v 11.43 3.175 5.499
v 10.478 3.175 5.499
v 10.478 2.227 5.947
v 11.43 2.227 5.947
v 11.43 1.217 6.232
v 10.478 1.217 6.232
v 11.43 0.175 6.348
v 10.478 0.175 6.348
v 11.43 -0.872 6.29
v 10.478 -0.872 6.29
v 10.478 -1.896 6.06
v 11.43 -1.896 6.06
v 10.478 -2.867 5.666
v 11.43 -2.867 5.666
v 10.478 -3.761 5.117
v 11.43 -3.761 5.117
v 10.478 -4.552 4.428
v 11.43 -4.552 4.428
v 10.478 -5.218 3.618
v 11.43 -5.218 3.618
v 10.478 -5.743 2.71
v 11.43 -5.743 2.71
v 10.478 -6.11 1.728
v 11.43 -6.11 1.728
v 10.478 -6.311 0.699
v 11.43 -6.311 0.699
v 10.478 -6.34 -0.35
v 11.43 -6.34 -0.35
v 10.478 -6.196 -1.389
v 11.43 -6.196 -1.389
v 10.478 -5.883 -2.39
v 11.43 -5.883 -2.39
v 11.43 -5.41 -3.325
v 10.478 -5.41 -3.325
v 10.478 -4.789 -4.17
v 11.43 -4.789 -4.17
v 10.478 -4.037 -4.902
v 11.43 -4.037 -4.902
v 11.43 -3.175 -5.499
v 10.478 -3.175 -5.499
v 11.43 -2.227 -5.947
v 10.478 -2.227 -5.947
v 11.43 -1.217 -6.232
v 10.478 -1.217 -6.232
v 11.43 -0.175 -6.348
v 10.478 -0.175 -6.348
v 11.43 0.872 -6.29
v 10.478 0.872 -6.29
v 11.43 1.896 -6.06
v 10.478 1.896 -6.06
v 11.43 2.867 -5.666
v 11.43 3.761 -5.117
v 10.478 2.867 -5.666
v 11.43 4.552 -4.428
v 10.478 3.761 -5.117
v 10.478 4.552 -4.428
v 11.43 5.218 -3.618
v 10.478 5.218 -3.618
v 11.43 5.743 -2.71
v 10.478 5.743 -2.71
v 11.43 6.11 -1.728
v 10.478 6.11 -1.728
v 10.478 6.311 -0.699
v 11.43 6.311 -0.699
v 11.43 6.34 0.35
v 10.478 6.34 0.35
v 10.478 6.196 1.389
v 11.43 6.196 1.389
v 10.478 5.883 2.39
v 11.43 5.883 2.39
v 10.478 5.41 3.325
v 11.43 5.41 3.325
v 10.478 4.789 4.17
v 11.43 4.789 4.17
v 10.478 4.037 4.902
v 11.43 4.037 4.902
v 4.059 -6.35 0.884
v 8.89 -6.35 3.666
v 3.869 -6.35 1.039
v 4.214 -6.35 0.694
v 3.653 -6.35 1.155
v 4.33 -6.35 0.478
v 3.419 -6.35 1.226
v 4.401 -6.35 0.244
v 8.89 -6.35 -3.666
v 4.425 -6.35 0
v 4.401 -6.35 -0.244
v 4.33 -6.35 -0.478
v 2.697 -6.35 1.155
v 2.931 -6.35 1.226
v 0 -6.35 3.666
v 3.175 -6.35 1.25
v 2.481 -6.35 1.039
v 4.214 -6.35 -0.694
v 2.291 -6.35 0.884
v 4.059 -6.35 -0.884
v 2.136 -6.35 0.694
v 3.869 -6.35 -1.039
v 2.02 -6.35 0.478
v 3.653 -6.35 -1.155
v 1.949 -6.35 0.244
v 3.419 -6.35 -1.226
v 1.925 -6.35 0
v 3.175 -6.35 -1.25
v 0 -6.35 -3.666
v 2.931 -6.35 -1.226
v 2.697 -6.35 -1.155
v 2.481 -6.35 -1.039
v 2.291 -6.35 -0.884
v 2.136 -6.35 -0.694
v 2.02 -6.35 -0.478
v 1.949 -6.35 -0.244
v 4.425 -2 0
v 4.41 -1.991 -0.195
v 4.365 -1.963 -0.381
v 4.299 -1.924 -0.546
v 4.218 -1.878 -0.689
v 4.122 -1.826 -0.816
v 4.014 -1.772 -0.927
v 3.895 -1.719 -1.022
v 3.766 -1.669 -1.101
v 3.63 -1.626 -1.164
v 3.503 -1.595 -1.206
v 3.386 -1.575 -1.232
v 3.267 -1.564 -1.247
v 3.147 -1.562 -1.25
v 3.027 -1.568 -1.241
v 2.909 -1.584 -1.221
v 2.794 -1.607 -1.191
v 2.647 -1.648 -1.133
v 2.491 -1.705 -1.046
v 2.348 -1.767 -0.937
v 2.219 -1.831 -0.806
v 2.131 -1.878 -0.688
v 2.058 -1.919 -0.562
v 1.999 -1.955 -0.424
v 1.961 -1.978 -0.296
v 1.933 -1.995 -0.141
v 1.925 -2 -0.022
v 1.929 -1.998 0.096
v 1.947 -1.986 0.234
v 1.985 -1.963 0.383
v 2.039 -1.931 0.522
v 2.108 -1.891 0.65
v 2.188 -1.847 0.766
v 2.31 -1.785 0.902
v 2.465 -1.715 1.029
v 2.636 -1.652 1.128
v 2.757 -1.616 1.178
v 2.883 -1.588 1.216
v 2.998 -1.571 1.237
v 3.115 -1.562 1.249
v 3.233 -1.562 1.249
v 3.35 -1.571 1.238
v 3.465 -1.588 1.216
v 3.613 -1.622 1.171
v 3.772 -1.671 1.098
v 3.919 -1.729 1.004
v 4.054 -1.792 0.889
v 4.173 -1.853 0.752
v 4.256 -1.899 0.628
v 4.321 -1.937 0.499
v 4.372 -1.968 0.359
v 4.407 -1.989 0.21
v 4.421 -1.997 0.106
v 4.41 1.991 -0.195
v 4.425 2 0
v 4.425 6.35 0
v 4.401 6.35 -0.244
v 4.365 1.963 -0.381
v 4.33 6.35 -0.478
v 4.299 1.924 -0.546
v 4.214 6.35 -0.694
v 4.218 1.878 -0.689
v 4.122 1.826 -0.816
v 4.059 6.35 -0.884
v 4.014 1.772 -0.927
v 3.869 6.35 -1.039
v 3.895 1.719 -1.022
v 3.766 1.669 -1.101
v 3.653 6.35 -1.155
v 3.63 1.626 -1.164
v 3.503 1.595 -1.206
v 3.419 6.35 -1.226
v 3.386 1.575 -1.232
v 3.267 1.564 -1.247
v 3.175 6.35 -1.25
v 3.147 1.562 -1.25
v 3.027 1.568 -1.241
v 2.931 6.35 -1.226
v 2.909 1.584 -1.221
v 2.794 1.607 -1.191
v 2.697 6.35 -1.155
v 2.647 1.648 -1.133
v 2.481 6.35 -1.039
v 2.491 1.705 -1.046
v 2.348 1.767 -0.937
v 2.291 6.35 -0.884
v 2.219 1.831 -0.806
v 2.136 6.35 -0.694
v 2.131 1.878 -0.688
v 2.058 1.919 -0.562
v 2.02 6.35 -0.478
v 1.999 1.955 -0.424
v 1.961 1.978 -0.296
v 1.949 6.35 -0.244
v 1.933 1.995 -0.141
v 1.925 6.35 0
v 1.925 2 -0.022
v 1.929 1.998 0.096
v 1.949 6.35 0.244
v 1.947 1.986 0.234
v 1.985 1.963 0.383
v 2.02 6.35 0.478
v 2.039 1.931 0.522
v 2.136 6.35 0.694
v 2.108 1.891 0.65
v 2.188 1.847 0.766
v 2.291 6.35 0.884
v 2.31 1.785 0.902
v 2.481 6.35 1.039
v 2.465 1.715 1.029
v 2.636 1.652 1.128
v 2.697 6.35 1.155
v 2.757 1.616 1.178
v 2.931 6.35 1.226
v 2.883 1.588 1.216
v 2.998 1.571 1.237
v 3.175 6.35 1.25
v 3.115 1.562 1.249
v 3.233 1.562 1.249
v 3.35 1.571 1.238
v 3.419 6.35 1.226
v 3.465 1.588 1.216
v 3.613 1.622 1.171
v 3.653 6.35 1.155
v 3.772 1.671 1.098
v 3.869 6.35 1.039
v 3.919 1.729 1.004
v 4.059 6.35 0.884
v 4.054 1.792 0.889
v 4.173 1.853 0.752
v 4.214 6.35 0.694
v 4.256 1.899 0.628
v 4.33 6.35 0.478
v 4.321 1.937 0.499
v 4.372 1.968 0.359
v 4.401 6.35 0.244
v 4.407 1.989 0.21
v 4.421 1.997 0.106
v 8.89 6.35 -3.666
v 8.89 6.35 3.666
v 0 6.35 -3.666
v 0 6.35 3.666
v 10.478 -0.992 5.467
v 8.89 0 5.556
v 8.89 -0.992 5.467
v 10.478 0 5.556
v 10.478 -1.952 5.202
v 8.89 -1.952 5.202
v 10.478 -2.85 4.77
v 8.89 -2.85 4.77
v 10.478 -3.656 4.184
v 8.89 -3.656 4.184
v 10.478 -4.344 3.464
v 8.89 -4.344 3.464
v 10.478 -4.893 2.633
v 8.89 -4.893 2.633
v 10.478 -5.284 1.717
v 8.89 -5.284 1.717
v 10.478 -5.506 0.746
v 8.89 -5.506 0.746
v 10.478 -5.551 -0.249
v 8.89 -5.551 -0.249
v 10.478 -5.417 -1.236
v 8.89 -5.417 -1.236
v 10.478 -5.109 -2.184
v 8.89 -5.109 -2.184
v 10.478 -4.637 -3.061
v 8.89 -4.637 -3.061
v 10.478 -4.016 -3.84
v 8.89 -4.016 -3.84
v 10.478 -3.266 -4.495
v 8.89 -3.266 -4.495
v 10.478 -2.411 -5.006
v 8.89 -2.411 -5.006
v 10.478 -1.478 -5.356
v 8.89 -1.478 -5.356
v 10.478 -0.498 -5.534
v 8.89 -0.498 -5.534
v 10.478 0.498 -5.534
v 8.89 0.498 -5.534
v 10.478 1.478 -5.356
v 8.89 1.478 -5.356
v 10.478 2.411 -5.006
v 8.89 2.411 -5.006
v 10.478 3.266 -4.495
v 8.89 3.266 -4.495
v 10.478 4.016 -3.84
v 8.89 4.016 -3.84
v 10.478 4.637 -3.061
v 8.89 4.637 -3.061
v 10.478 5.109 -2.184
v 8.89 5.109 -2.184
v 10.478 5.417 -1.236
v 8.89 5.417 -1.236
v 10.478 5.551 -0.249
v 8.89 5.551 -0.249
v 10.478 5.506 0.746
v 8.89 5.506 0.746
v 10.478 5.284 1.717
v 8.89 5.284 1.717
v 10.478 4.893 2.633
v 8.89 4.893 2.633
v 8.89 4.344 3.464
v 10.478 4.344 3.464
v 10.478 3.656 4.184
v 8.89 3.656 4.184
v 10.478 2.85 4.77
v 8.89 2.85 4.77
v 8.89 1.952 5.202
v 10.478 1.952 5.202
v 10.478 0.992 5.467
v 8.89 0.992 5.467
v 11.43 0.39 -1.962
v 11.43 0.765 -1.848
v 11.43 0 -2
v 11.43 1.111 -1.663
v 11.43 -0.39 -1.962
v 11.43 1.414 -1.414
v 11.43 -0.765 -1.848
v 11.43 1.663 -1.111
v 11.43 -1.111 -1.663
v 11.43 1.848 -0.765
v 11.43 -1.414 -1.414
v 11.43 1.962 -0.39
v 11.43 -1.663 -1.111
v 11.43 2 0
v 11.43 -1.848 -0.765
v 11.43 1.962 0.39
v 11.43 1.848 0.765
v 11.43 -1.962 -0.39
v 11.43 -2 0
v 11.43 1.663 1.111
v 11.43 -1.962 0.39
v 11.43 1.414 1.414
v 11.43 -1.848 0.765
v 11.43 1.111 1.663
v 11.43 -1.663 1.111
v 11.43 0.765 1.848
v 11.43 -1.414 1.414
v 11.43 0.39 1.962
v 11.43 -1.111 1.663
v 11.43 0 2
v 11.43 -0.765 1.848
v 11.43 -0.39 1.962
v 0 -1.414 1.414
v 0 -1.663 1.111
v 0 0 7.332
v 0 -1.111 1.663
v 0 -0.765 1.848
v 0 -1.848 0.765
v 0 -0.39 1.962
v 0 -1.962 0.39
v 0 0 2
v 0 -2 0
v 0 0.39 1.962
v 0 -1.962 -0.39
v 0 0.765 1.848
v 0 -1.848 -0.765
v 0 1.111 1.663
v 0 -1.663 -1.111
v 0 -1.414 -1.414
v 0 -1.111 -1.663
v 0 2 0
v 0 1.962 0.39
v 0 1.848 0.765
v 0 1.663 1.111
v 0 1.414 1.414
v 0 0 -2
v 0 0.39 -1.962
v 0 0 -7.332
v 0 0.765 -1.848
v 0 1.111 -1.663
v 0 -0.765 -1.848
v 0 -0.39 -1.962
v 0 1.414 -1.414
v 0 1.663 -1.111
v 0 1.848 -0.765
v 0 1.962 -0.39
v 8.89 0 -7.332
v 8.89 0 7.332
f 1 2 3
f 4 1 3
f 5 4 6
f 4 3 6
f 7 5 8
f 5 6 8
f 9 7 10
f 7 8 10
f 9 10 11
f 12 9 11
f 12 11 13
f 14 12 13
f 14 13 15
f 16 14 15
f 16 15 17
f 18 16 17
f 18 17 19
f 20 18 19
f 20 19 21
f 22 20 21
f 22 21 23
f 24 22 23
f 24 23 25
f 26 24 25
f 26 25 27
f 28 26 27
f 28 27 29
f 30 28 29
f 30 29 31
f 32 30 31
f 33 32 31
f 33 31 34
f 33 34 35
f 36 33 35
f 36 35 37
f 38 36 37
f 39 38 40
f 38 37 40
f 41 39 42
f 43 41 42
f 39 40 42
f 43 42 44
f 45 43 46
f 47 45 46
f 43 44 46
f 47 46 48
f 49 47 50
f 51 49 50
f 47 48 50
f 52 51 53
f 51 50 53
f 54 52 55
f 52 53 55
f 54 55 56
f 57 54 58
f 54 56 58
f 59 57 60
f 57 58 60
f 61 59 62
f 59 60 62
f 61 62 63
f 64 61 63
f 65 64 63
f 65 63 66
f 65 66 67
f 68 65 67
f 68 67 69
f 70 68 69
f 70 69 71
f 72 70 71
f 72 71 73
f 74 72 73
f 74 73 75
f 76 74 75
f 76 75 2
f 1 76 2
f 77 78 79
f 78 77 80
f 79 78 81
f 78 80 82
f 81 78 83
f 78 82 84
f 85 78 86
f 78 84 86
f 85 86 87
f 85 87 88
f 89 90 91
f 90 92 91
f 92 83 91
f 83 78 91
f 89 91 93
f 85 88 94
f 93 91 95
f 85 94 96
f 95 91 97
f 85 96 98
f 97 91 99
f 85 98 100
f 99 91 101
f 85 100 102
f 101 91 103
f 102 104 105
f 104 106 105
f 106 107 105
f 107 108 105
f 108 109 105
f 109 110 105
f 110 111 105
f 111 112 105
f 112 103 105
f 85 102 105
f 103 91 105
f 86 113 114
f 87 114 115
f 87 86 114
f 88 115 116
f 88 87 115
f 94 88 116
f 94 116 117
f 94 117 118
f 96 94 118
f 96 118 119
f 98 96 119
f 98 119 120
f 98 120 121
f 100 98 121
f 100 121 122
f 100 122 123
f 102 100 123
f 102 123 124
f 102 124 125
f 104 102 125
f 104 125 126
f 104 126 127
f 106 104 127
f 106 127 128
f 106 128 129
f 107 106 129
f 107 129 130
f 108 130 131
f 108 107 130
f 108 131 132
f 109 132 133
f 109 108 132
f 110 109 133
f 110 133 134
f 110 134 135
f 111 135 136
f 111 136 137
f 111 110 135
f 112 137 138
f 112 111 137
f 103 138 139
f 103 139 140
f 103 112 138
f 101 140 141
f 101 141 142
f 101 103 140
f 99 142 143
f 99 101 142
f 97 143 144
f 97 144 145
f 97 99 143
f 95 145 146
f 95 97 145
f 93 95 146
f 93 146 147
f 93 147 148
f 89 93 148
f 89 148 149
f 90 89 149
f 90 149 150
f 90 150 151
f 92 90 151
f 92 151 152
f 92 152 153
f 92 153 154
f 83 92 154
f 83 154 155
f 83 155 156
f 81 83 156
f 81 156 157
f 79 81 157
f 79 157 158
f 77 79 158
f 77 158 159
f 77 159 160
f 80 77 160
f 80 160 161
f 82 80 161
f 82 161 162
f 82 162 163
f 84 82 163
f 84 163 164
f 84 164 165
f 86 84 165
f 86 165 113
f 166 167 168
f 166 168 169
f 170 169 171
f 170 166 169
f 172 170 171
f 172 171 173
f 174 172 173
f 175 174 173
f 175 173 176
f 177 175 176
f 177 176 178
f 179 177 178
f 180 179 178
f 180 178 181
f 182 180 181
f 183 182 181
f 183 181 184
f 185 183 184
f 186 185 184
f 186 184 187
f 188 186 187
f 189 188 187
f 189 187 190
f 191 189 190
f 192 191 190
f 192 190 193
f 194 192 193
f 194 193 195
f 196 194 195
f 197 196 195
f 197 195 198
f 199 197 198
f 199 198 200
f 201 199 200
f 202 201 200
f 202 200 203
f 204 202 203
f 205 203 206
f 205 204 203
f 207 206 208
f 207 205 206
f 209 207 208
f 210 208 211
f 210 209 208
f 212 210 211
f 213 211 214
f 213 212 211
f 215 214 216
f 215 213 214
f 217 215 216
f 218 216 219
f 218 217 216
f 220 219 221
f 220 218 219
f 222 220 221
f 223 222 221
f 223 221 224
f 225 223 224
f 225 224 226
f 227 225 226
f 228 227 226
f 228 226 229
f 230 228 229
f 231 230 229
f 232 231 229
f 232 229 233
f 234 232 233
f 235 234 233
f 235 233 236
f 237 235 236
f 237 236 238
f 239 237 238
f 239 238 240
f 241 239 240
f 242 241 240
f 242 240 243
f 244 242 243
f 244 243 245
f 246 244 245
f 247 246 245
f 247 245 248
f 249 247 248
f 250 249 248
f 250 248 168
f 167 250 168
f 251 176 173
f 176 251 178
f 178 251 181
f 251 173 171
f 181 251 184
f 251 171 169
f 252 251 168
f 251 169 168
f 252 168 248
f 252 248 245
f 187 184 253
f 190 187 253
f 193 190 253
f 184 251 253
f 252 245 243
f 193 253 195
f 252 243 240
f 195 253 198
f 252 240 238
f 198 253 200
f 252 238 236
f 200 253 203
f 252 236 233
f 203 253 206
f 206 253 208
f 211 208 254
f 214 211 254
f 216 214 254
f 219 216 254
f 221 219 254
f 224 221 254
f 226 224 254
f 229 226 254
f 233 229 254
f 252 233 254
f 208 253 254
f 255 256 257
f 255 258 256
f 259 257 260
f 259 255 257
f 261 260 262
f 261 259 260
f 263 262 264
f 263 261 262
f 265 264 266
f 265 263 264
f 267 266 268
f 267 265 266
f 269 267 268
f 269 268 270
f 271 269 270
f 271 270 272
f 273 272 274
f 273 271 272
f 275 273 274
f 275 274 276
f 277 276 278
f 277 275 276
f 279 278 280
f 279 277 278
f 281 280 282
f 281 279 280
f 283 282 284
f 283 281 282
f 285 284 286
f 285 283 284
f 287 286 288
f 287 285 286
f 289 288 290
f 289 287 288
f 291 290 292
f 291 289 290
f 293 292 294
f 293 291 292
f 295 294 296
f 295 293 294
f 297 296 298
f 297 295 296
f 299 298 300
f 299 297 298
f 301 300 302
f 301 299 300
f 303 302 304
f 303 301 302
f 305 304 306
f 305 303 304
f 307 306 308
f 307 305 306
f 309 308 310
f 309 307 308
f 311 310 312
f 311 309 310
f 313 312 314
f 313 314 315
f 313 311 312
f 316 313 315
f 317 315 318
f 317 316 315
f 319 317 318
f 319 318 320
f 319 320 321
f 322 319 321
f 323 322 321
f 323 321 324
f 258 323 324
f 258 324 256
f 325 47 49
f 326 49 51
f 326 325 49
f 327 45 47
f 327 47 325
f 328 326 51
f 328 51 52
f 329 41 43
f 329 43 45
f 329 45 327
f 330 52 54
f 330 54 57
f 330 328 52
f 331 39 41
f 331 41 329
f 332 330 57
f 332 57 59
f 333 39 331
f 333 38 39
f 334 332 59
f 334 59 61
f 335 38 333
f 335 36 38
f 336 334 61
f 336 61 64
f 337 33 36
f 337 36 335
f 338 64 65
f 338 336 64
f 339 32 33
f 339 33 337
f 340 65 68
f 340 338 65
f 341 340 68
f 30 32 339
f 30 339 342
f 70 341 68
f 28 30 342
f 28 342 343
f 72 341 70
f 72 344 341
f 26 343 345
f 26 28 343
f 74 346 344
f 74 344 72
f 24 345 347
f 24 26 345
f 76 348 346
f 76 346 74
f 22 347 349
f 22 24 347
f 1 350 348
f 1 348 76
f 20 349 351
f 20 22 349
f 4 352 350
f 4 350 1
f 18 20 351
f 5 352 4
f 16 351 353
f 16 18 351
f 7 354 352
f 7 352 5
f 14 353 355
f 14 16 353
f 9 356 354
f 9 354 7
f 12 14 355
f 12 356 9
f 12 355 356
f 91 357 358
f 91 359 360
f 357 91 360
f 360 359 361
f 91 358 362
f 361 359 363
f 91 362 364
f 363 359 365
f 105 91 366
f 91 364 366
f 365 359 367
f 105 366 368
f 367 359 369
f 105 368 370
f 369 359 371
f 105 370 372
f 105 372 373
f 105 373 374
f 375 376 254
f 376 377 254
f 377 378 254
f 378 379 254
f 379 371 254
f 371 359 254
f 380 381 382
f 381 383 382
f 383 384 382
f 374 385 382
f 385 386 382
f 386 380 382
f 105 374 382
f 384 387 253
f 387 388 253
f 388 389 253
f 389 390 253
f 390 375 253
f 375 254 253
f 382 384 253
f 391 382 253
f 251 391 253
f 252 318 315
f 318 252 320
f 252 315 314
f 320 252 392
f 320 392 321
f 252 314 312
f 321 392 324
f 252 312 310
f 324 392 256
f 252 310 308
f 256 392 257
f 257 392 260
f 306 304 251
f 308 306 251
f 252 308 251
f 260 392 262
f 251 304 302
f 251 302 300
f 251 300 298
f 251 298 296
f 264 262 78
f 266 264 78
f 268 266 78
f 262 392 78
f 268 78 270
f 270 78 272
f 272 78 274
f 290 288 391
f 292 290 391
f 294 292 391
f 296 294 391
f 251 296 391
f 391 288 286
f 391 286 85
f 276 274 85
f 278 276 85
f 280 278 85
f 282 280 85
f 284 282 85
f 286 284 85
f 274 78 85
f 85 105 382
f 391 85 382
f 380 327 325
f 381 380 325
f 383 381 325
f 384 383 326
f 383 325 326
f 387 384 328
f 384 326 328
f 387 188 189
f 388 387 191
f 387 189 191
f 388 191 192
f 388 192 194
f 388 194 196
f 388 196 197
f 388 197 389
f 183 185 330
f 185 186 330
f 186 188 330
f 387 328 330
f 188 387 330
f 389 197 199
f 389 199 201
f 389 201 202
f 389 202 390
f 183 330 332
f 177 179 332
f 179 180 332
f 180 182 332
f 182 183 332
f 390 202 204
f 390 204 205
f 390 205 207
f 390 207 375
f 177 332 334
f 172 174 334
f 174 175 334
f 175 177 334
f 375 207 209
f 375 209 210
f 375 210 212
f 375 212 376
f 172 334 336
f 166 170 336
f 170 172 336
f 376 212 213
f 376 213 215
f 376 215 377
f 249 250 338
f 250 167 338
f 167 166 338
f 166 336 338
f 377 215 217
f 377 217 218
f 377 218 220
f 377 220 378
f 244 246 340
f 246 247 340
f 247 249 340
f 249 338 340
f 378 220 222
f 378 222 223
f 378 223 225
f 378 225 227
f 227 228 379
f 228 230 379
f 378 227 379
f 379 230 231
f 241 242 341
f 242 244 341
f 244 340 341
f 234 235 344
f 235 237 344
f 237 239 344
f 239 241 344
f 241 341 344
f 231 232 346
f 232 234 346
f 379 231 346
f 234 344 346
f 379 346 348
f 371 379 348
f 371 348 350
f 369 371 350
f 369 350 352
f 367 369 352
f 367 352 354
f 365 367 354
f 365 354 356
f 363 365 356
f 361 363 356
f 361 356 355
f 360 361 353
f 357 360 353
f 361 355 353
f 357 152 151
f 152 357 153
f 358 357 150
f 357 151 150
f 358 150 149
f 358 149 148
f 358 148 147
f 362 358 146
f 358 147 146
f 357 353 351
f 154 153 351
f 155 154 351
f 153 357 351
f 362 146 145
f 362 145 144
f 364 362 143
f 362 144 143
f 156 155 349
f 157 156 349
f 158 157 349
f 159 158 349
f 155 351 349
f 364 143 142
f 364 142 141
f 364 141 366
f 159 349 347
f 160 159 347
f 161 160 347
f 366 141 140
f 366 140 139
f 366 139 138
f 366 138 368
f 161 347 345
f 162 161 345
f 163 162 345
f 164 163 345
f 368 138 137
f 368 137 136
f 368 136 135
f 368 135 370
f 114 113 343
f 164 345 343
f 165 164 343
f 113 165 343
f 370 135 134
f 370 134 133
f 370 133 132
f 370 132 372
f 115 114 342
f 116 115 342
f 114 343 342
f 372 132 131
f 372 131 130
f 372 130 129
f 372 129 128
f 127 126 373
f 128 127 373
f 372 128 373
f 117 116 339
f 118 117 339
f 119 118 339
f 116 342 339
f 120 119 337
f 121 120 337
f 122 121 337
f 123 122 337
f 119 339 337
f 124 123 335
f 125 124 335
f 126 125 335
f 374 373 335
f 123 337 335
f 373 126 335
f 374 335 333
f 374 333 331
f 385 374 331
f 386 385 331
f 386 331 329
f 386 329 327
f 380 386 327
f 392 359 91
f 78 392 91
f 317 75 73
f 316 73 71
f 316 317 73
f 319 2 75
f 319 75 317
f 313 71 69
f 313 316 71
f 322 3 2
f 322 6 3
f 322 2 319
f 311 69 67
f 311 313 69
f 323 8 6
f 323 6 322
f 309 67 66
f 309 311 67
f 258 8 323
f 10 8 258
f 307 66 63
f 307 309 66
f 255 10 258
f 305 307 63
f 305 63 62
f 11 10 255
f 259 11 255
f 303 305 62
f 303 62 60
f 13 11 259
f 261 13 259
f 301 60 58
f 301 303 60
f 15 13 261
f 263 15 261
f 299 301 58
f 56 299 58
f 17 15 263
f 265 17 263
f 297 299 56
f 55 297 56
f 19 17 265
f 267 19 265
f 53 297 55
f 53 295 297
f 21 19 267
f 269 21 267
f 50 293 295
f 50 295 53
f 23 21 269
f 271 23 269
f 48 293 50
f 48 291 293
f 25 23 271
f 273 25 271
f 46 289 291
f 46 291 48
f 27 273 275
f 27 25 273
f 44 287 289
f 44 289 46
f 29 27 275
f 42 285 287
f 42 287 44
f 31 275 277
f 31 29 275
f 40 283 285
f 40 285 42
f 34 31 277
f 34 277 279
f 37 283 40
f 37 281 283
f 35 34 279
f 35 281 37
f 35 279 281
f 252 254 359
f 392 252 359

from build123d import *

# Parameters (mm, degrees)
BOSS_EXTRUDE1_DEPTH     = 8.89
SKETCH3_R               = 6.35
BOSS_EXTRUDE2_DEPTH     = 2.54
SKETCH4_W               = 1.5875
SKETCH4_H               = 0.79375
CUT_EXTRUDE1_REACH      = 16.991
SKETCH6_R               = 2
ADVANCEDHOLE1_START     = -6.35
ADVANCEDHOLE1_OUTLINE_R = 1.25
ADVANCEDHOLE1_DEPTH     = 12.7


# Read off the part's stored shape, not the designer's step: AdvancedHole1
with BuildPart() as part:
    # Sketch2 → Boss-Extrude1 (new body)
    with BuildSketch(Plane(origin=(0, 0, 0), x_dir=(0, 0, -1), z_dir=(1, 0, 0))):
        Polygon((7.332348419, 0), (3.666174209, 6.35), (-3.666174209, 6.35), (-7.332348419, 0), (-3.666174209, -6.35), (3.666174209, -6.35), align=None)
    extrude(amount=BOSS_EXTRUDE1_DEPTH)

    # Sketch3 → Boss-Extrude2 (add)
    with BuildSketch(Plane(origin=(8.89, 0, 0), x_dir=(0, 0, -1), z_dir=(1, 0, 0))):
        with Locations(Location((0, 0, 0), (0, 0, 150))):
            Circle(SKETCH3_R)
    extrude(amount=BOSS_EXTRUDE2_DEPTH)

    # Sketch4 → Cut-Revolve1 (revolve, cut)
    with BuildSketch(Plane.XY, mode=Mode.PRIVATE) as cut_revolve1_sk:
        with Locations((9.68375, 5.953125)):
            Rectangle(SKETCH4_W, SKETCH4_H)
    revolve(cut_revolve1_sk.sketch.rotate(Axis((0, 0, 0), (1, 0, 0)), 90), axis=Axis((0, 0, 0), (1, 0, 0)), mode=Mode.SUBTRACT)

    # Sketch6 → Cut-Extrude1 (cut, up to next)
    with BuildSketch(Plane(origin=(11.43, 0, 0), x_dir=(0, 0, -1), z_dir=(1, 0, 0)), mode=Mode.PRIVATE) as cut_extrude1_sk1:
        Circle(SKETCH6_R)
    cut_extrude1_tool1 = extrude(cut_extrude1_sk1.sketch, amount=-CUT_EXTRUDE1_REACH, mode=Mode.PRIVATE) & part.part
    add(cut_extrude1_tool1.solids().sort_by_distance((11.43, 0, 0))[0], mode=Mode.SUBTRACT)

    # AdvancedHole1 outline → AdvancedHole1 (cut)
    with BuildSketch(Plane(origin=(0, 0, 0), x_dir=(1, 0, 0), z_dir=(0, 1, 0)).offset(ADVANCEDHOLE1_START)):
        with Locations((3.175, 0)):
            Circle(ADVANCEDHOLE1_OUTLINE_R)
    extrude(amount=ADVANCEDHOLE1_DEPTH, mode=Mode.SUBTRACT)


solid = part.part
